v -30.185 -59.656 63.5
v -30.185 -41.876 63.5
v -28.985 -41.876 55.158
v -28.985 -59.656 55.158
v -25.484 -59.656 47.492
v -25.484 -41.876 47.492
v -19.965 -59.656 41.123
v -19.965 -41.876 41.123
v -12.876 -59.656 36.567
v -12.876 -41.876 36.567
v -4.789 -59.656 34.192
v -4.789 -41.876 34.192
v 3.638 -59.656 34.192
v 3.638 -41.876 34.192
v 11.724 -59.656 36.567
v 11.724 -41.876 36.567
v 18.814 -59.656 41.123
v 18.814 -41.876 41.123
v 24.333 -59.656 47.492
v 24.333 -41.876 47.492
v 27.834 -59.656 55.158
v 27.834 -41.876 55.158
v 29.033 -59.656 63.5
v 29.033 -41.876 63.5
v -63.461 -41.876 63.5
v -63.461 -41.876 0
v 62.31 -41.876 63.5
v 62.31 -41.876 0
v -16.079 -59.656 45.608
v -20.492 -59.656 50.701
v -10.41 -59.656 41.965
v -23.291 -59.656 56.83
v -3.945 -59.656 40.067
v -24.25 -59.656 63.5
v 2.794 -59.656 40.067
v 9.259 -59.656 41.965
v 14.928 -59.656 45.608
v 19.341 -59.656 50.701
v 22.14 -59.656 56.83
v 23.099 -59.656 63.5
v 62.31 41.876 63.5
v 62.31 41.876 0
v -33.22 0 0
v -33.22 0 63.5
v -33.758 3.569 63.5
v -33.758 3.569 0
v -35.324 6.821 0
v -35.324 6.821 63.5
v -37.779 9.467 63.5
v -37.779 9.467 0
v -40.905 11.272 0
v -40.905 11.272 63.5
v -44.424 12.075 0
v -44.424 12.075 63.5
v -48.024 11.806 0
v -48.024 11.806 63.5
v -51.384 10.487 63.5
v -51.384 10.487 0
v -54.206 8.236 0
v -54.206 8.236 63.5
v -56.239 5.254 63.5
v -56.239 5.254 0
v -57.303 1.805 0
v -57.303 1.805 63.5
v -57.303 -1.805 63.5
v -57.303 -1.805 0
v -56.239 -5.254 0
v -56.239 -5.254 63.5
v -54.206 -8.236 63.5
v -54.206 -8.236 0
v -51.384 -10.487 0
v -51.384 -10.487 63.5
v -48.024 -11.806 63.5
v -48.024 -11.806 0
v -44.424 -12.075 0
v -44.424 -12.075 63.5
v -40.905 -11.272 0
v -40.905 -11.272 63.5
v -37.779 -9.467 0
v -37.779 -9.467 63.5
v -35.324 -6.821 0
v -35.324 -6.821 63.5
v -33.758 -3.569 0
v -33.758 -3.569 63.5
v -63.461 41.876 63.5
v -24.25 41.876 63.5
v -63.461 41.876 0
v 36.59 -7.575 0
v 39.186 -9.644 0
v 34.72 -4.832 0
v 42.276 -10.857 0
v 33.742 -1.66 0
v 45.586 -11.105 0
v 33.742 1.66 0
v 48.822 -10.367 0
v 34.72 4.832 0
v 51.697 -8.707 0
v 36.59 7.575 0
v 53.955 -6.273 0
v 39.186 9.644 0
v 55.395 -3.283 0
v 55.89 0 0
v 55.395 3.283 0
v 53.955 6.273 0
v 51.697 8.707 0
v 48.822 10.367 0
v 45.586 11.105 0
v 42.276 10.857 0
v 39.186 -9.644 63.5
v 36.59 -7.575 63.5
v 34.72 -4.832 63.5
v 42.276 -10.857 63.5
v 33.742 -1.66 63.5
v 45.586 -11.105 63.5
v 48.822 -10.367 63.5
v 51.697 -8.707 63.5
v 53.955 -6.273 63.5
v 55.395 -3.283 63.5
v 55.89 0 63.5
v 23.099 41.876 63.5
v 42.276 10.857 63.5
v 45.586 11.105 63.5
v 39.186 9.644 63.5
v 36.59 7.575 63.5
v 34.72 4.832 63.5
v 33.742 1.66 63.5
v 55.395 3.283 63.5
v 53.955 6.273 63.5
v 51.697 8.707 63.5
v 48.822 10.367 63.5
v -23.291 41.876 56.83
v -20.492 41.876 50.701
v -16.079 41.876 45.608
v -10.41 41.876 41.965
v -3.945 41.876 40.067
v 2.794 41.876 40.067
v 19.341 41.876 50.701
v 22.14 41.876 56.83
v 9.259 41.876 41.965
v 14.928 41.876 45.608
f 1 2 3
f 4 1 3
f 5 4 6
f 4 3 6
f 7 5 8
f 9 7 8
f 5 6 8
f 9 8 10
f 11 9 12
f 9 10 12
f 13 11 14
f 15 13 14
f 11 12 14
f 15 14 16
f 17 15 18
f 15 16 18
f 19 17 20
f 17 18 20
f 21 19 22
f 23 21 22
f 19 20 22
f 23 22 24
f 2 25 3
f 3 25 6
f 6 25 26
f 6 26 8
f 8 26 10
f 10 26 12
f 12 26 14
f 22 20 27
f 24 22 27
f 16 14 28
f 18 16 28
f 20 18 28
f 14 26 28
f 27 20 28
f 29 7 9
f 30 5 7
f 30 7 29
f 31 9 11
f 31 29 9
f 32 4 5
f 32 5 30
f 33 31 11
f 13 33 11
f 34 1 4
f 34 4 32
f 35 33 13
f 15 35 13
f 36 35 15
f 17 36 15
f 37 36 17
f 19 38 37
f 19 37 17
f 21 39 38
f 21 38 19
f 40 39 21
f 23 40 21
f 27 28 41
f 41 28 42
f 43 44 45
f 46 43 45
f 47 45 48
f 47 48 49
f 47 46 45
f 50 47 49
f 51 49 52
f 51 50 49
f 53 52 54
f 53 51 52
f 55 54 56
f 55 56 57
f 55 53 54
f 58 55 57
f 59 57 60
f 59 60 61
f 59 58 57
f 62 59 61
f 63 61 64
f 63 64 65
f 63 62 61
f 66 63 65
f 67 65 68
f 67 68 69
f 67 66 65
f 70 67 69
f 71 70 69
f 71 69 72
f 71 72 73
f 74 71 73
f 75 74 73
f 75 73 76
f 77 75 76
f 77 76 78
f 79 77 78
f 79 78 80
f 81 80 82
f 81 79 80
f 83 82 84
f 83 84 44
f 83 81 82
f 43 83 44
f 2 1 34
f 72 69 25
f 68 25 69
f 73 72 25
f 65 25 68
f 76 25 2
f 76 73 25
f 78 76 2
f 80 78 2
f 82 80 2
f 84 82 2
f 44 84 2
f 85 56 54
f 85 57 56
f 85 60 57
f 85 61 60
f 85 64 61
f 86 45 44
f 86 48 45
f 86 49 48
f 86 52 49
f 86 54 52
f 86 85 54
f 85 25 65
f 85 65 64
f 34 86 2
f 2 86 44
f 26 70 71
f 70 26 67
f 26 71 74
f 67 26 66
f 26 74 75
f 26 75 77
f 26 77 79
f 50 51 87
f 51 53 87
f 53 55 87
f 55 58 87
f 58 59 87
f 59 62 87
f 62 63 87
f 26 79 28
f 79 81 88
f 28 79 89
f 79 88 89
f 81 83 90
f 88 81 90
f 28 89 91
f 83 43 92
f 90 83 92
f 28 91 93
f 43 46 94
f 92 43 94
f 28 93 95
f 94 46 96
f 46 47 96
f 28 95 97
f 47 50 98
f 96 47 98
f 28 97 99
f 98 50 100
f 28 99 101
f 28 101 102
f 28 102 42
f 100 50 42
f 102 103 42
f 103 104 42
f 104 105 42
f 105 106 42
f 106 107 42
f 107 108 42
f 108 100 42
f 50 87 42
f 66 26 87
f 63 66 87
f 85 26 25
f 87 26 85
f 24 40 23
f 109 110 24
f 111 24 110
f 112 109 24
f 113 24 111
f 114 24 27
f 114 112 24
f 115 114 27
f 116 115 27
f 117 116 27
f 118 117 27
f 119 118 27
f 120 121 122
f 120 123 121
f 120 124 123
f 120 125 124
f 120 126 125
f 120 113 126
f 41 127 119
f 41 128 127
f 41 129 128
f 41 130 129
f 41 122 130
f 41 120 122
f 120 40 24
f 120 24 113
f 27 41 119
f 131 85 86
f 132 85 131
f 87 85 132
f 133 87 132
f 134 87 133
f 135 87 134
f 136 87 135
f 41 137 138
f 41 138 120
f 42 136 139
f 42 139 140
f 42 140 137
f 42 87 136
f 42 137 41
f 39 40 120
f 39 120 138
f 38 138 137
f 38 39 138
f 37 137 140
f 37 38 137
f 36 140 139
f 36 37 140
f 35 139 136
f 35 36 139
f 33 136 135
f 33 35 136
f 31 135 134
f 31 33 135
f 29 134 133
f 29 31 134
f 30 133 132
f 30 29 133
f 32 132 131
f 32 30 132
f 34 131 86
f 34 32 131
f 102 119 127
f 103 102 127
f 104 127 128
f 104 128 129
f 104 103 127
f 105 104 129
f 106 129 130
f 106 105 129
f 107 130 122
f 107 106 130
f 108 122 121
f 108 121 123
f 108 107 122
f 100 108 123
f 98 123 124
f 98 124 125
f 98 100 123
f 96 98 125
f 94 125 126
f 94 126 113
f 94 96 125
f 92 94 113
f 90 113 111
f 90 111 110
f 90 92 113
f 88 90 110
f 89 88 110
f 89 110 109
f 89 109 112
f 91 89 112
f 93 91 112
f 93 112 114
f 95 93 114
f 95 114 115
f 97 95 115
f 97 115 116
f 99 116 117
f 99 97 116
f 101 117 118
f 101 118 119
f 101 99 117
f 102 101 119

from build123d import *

# Parameters (mm, degrees)
F0_W     = 125.7711164653
F0_H     = 83.7514773011
F0_R     = 12.1092368637
F0_R_2   = 11.1364451926
F1_DEPTH = 63.5
F3_DEPTH = 17.78
F4_DEPTH = 98.044


with BuildPart() as f1:
    # F0 (on Top) → F1 (new body)
    with BuildSketch(Plane.XY):
        with Locations((-0.5756113678, 0)):
            Rectangle(F0_W, F0_H)
        with Locations((-45.3294068575, 0)):
            Circle(F0_R, mode=Mode.SUBTRACT)
        with Locations((44.7537973523, 0)):
            Circle(F0_R_2, mode=Mode.SUBTRACT)
    extrude(amount=F1_DEPTH)

    # F2 (on face) → F3 (join)
    with BuildSketch(Plane.XZ.offset(41.8757386506)):
        with BuildLine():
            Line((29.0334055844, 63.5), (23.0987426611, 63.5))
            ThreePointArc((23.0987426611, 63.5), (-0.5756113678, 39.8256459711), (-24.2499653967, 63.5))
            Line((-24.2499653967, 63.5), (-30.1846283201, 63.5))
            ThreePointArc((-30.1846283201, 63.5), (-0.5756113678, 33.8909830478), (29.0334055844, 63.5))
        make_face()
    extrude(amount=F3_DEPTH)

    # F4 (cut): a face of the model
    f4_faces = [f1.faces().sort_by_distance(p)[0] for p in [
        (-0.5756113678, -41.8757386506, 53.4522920848),
    ]]
    extrude(f4_faces, amount=-F4_DEPTH, mode=Mode.SUBTRACT)


solid = f1.part
